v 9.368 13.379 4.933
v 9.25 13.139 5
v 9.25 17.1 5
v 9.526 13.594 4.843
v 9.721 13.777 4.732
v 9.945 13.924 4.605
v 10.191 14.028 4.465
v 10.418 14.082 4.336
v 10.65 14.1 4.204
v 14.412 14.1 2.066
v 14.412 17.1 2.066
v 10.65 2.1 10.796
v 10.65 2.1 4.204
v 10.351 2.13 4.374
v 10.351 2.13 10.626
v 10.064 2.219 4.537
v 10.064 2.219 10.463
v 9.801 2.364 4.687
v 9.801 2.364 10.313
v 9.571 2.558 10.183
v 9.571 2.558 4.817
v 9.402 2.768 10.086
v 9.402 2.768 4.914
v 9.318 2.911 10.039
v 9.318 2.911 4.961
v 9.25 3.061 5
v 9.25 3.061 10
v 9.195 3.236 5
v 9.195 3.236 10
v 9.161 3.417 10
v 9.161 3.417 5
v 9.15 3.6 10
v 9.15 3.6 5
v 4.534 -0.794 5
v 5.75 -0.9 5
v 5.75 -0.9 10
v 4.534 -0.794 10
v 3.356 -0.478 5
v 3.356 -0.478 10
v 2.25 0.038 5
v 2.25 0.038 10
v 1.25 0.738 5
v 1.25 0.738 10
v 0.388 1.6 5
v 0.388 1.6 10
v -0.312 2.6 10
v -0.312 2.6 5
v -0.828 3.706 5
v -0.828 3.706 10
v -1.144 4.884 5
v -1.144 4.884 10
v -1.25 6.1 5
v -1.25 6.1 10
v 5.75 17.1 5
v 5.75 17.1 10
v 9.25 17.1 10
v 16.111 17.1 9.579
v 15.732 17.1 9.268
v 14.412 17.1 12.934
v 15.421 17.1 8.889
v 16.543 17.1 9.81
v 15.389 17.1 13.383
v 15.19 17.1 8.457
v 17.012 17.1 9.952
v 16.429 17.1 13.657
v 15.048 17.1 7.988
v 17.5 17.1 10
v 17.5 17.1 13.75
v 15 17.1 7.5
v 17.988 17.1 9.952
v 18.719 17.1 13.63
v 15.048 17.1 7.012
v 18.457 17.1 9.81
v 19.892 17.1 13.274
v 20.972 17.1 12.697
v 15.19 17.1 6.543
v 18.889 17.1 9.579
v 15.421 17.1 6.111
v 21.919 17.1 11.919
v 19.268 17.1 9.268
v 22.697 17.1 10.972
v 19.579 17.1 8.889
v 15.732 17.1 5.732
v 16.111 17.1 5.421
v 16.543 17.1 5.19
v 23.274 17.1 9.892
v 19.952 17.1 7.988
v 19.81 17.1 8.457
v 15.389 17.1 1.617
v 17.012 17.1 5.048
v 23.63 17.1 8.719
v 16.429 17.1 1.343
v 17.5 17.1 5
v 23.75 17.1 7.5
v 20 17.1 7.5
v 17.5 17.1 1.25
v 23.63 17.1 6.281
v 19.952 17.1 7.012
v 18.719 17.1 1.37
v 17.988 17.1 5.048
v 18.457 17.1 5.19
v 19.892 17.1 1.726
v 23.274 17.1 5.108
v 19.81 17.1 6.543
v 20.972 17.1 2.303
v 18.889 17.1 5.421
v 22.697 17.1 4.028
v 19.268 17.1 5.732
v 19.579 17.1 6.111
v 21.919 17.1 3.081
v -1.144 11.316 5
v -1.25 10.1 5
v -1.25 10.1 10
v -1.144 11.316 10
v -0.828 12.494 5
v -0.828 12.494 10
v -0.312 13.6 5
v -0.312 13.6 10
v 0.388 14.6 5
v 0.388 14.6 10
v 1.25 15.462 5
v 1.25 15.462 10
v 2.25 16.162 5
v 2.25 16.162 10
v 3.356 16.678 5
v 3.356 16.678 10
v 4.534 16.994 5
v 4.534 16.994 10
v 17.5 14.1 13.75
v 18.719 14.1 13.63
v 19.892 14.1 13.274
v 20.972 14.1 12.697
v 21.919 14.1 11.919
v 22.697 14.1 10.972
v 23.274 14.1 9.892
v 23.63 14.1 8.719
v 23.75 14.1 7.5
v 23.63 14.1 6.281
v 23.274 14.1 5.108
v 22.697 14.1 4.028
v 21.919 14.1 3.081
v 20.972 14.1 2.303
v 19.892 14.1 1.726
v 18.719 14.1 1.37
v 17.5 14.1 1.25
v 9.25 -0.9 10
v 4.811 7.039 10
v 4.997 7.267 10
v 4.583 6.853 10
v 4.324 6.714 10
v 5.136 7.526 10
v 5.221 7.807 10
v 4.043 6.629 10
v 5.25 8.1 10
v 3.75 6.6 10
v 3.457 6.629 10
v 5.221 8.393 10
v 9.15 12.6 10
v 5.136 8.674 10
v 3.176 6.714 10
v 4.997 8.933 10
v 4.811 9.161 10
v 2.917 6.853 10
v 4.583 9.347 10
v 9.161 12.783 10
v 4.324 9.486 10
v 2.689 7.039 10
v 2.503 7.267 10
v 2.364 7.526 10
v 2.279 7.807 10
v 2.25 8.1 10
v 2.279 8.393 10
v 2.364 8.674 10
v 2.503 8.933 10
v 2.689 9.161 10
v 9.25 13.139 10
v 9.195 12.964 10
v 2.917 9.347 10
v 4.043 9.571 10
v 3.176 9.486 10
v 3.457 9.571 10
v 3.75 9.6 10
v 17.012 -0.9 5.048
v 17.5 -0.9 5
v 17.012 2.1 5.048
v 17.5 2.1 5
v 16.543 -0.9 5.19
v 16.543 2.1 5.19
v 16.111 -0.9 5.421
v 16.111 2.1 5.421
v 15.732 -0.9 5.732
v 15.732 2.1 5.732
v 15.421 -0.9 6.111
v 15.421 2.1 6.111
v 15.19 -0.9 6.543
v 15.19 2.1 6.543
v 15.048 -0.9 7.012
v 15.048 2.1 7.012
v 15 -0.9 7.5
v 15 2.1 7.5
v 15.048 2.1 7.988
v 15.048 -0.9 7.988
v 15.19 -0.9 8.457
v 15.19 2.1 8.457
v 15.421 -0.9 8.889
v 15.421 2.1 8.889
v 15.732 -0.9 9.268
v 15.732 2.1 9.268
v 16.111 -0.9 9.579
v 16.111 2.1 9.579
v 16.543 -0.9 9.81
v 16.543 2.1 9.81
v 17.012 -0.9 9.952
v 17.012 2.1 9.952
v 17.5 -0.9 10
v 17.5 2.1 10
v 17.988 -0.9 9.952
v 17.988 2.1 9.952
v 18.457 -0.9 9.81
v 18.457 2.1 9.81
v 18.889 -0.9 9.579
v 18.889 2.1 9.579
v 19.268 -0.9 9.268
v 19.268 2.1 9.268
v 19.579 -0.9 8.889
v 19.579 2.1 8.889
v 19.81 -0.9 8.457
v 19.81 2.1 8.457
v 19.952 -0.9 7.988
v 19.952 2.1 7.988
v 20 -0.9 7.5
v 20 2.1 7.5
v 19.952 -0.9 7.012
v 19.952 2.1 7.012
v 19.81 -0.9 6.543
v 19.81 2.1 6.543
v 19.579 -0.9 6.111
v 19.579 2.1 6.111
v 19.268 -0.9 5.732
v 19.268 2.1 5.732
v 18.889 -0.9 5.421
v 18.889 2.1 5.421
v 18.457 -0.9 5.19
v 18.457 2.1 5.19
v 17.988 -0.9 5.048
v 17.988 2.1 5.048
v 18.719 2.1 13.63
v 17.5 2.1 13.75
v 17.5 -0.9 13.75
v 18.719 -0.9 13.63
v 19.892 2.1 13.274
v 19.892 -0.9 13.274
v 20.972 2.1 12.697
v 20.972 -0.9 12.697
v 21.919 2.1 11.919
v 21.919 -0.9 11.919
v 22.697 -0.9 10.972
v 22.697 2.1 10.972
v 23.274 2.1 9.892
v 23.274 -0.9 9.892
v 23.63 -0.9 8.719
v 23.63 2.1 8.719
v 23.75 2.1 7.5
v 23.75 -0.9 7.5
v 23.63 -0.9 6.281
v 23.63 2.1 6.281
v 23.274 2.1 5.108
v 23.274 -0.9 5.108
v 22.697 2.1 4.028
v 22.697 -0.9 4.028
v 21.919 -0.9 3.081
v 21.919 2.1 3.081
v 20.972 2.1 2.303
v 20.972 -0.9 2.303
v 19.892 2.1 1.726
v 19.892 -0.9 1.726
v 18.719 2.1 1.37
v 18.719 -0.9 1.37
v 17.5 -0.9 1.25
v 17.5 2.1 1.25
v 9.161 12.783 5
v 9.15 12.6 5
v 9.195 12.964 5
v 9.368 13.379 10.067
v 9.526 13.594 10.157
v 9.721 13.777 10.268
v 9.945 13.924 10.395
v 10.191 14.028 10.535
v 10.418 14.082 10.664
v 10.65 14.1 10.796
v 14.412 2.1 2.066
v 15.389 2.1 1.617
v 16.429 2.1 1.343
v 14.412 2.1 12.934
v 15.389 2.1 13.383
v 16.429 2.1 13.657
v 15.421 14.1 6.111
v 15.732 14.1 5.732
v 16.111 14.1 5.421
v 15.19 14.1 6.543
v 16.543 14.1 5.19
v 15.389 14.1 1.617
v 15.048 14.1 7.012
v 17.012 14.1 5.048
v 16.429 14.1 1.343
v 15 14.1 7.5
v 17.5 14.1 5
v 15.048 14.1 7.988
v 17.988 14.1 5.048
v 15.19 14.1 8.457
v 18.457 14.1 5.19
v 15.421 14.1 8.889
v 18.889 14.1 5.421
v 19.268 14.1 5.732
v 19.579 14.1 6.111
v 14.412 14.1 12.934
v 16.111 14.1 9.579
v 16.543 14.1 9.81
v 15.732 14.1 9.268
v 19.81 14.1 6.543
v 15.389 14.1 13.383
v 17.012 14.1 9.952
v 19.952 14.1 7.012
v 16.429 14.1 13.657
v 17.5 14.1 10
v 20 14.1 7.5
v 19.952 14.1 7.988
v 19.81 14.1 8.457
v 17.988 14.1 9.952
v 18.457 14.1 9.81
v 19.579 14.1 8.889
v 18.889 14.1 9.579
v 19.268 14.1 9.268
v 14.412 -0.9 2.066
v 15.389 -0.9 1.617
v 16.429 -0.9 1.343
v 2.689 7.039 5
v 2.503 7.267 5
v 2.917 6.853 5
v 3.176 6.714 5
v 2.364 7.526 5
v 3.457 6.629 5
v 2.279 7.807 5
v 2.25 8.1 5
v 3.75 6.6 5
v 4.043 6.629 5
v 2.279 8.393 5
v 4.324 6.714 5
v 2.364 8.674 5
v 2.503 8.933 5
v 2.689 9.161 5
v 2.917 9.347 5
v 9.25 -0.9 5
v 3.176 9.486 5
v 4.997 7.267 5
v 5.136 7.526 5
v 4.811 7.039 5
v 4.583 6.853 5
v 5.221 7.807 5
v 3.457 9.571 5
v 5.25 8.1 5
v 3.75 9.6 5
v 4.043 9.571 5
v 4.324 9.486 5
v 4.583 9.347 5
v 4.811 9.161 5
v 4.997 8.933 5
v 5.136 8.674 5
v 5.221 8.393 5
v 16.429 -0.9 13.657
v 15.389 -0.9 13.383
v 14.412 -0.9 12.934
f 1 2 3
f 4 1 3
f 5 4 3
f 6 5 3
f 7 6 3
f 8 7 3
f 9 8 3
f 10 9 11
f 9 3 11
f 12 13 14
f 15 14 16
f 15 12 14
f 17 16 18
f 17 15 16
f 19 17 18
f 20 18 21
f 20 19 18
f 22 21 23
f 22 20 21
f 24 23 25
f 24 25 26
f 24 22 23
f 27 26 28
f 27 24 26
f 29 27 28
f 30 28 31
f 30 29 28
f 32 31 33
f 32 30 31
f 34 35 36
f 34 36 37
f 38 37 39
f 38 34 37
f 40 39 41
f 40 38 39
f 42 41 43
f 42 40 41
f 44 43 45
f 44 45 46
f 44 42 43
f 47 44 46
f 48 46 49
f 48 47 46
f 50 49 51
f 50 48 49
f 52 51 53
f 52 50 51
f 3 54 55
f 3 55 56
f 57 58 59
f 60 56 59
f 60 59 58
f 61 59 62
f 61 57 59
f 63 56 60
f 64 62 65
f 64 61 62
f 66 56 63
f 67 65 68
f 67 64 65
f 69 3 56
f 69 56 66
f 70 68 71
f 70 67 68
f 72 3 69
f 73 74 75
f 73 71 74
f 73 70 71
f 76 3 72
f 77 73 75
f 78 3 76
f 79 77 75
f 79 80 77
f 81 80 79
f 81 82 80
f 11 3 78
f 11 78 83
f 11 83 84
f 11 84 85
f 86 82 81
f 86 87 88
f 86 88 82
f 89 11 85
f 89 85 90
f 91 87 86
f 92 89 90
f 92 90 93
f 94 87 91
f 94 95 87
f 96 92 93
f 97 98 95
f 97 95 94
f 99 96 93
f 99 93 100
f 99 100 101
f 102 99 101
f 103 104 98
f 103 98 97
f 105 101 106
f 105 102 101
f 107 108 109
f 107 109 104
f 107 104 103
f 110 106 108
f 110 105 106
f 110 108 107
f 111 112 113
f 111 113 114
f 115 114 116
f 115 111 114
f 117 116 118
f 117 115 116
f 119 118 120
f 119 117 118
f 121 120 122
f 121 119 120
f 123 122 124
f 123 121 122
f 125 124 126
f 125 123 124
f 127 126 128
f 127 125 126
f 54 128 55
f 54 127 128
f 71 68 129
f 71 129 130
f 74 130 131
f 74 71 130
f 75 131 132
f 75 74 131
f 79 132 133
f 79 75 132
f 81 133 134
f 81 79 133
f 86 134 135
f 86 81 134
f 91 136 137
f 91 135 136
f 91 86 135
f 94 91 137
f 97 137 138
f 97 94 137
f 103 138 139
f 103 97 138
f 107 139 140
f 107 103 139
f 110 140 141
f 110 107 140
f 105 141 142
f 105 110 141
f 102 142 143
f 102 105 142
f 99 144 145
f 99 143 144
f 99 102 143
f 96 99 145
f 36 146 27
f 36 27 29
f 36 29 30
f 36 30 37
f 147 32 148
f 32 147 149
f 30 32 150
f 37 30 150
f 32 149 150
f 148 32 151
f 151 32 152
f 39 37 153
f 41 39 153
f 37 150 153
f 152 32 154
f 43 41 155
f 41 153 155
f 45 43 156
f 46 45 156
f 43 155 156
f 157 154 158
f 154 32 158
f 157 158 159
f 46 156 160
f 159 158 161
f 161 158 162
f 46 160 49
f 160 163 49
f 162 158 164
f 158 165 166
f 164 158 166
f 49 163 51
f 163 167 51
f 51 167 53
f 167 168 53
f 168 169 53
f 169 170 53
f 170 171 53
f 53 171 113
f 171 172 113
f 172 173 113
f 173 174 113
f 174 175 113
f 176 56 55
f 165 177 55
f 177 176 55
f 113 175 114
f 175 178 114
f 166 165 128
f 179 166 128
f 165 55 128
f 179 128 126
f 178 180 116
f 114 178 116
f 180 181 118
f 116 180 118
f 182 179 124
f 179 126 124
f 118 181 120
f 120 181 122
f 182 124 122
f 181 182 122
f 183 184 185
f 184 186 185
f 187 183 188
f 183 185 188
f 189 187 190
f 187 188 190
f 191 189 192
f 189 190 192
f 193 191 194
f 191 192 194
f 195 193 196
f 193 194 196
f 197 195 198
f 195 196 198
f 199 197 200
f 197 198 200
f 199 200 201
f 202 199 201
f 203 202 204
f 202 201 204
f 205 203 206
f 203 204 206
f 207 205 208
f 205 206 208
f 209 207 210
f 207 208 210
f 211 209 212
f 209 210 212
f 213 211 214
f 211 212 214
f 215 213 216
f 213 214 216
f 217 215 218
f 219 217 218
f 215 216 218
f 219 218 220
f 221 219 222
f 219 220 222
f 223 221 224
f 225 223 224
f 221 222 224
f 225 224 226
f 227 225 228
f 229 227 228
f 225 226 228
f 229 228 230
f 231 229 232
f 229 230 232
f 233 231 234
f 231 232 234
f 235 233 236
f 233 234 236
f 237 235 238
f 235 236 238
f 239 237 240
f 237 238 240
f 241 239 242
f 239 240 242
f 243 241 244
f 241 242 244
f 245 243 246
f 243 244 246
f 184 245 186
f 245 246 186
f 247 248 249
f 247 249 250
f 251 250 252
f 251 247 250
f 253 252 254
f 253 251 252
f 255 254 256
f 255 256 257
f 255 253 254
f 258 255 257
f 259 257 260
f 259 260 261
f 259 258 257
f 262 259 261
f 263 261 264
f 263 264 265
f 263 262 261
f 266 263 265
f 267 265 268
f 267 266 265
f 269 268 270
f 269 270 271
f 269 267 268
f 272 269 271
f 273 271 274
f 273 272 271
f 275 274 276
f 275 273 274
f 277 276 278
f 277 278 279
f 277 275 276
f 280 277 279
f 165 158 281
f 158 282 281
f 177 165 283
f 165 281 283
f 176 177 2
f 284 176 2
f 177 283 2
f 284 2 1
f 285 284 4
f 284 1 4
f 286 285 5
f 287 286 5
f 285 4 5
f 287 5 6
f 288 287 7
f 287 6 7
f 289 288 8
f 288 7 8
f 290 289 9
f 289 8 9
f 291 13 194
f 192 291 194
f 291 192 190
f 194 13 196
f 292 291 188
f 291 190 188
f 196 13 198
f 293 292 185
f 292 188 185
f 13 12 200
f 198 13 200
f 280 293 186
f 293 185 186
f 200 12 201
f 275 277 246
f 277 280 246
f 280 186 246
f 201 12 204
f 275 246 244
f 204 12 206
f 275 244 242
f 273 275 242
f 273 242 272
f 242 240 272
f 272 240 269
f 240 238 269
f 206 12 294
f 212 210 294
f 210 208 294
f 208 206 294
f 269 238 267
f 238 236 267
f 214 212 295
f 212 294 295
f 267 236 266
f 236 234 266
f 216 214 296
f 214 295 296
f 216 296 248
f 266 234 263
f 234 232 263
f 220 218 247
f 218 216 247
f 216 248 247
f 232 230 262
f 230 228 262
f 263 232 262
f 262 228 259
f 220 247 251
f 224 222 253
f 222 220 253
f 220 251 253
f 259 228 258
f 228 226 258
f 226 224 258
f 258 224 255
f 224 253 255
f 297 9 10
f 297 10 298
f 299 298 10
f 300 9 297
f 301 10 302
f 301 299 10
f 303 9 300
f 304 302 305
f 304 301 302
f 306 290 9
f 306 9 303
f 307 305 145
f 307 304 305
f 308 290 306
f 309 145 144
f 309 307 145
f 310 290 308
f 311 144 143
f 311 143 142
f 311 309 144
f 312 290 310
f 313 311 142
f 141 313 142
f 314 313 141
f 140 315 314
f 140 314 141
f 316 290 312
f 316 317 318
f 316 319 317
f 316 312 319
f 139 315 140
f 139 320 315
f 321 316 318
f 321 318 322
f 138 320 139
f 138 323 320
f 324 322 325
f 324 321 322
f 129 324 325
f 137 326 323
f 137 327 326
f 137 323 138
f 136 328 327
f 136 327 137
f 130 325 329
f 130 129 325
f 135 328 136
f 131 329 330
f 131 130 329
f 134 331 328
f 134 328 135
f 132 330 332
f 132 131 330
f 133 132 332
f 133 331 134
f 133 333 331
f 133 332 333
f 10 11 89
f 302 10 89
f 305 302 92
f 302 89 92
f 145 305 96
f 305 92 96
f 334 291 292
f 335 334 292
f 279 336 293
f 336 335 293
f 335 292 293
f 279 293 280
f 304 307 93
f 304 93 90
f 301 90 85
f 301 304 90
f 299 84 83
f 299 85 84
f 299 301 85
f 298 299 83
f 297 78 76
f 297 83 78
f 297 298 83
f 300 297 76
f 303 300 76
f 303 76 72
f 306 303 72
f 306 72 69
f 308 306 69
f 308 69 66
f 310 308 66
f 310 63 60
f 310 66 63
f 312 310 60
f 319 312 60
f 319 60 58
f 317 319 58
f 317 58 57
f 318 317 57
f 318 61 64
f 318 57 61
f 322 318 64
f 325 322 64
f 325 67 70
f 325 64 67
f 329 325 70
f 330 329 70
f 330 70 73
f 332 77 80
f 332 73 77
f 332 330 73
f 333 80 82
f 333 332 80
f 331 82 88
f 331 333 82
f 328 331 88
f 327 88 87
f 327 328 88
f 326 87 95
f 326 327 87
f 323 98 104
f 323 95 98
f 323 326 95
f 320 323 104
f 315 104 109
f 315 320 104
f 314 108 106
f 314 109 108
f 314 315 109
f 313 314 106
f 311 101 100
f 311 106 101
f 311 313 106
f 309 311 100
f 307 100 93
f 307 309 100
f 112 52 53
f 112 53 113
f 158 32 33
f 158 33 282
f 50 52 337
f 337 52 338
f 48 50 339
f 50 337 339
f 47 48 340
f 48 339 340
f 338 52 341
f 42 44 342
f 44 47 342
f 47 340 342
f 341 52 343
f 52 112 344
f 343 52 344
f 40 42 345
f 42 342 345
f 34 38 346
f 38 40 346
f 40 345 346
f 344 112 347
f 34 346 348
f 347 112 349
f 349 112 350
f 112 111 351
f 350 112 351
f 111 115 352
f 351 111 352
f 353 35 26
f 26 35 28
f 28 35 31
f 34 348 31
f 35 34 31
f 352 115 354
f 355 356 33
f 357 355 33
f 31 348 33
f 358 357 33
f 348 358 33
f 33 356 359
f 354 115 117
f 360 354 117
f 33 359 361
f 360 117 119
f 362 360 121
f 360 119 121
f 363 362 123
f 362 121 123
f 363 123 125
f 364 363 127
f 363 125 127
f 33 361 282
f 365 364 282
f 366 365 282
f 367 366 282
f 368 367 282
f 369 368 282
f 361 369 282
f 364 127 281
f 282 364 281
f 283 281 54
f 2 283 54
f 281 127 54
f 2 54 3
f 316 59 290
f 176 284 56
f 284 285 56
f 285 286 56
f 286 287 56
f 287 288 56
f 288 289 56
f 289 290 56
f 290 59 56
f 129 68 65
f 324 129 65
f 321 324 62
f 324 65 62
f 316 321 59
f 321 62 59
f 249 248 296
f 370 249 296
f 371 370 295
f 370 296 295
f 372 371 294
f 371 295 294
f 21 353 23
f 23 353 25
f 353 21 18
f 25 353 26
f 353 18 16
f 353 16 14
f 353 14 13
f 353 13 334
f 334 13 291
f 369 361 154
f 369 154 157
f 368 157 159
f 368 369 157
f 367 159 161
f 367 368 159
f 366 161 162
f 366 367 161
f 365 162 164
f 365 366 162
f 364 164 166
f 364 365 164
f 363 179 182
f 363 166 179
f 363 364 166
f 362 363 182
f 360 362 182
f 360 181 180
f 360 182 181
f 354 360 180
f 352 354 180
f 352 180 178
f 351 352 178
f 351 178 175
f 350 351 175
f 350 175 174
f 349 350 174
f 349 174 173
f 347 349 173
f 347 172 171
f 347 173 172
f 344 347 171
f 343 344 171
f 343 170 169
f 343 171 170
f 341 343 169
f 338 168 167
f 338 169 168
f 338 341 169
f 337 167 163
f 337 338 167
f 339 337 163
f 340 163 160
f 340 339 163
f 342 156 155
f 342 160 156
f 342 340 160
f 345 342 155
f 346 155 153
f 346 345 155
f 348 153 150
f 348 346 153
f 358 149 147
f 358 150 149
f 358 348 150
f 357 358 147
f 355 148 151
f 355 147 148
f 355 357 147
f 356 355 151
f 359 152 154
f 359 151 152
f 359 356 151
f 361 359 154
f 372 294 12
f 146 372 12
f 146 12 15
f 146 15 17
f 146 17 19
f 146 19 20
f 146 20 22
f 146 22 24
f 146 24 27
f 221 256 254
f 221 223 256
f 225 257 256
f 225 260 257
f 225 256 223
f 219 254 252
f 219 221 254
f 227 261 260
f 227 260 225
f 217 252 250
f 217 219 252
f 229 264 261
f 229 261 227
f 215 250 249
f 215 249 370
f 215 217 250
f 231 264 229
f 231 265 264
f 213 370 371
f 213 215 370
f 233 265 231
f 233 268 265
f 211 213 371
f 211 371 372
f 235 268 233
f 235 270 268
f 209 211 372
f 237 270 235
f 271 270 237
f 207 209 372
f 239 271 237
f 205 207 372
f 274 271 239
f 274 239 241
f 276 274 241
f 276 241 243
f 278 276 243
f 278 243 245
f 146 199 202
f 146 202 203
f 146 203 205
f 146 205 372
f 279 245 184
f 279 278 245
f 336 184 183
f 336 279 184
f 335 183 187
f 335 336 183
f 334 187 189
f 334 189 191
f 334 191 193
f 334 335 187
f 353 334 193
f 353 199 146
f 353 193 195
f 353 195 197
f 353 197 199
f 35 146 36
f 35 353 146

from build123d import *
from build123d.topology import SkipClean

# Parameters (mm, degrees)
CROQUIS1_R              = 1.5
SALIENTE_EXTRUIR1_DEPTH = 15
CROQUIS2_R              = 2.5
CORTAR_EXTRUIR1_DEPTH   = 20
CORTAR_EXTRUIR2_DEPTH   = 22
CROQUIS4_W              = 3.68086323
CROQUIS4_H              = 12
CORTAR_EXTRUIR3_DEPTH   = 10
REDONDEO1_R             = 1.5


with BuildPart() as part:
    # Croquis1 → Saliente-Extruir1 (new body)
    with BuildSketch(Plane.XY):
        with BuildLine():
            Line((11.25, 14.1), (11.25, 11.1))
            Line((11.25, 11.1), (11.25, 5.1))
            Line((11.25, 5.1), (11.25, 2.1))
            Line((11.25, 2.1), (23.75, 2.1))
            Line((23.75, 2.1), (23.75, -0.9))
            Line((23.75, -0.9), (11.25, -0.9))
            Line((11.25, -0.9), (5.75, -0.9))
            ThreePointArc((5.75, -0.9), (0.800252532, 1.150252532), (-1.25, 6.1))
            Line((-1.25, 6.1), (-1.25, 10.1))
            ThreePointArc((-1.25, 10.1), (0.800252532, 15.049747468), (5.75, 17.1))
            Line((5.75, 17.1), (11.25, 17.1))
            Line((11.25, 17.1), (23.75, 17.1))
            Line((23.75, 17.1), (23.75, 14.1))
            Line((23.75, 14.1), (11.25, 14.1))
        make_face()
        with Locations((3.75, 8.1)):
            Circle(CROQUIS1_R, mode=Mode.SUBTRACT)
    extrude(amount=SALIENTE_EXTRUIR1_DEPTH)

    # Croquis2 → Cortar-Extruir1 (cut, symmetric)
    with BuildSketch(Plane(origin=(0, 0, 0), x_dir=(1, 0, 0), z_dir=(0, 1, 0))):
        with Locations(Location((17.5, -7.5, 0), (0, 0, 90))):
            Circle(CROQUIS2_R)
        with BuildLine():
            Line((17.5, -1.25), (11.25, 0))
            Line((11.25, 0), (11.126279301, 1.868603497))
            Line((11.126279301, 1.868603497), (29.663453957, 1.868603497))
            Line((29.663453957, 1.868603497), (29.663453957, -17.961269996))
            Line((29.663453957, -17.961269996), (11.25, -17.961269996))
            Line((11.25, -17.961269996), (11.25, -15))
            Line((11.25, -15), (17.5, -13.75))
            ThreePointArc((17.5, -13.75), (23.75, -7.5), (17.5, -1.25))
        make_face()
    extrude(amount=CORTAR_EXTRUIR1_DEPTH, both=True, mode=Mode.SUBTRACT)

    # Croquis3 → Cortar-Extruir2 (cut)
    with SkipClean():  # the faces are left unmerged after this step: merging them gives an invalid solid
        with BuildSketch(Plane(origin=(0, 17.1, 0), x_dir=(1, 0, 0), z_dir=(0, 1, 0))):
            Polygon((5.75, -10), (-2.050741432, -10), (-2.325121179, -18.2596058), (20.840368904, -18.2596058), (17.5, -13.75), (11.25, -15), (5.75, -15), align=None)
            with BuildLine():
                Line((9.25, -10), (5.75, -10))
                Line((5.75, -10), (5.75, -15))
                Line((5.75, -15), (11.25, -15))
                Line((11.25, -15), (17.5, -13.75))
                ThreePointArc((17.5, -13.75), (15.902831918, -13.542479137), (14.41172646, -12.933697318))
                Line((14.41172646, -12.933697318), (9.25, -10))
            make_face()
            with BuildLine():
                Line((5.75, 0), (5.75, -5))
                Line((5.75, -5), (9.25, -5))
                Line((9.25, -5), (14.41172646, -2.066302682))
                ThreePointArc((14.41172646, -2.066302682), (15.902831918, -1.457520863), (17.5, -1.25))
                Line((17.5, -1.25), (11.25, 0))
                Line((11.25, 0), (5.75, 0))
            make_face()
            Polygon((-2.050741432, -5), (5.75, -5), (5.75, 0), (11.25, 0), (17.5, -1.25), (17.5, 1.613327317), (-2.050741432, 1.613327317), align=None)
        extrude(amount=-CORTAR_EXTRUIR2_DEPTH, mode=Mode.SUBTRACT)

    # Croquis4 → Cortar-Extruir3 (cut, symmetric)
    with SkipClean():  # the faces are left unmerged after this step: merging them gives an invalid solid
        with BuildSketch(Plane.XY.offset(10)):
            with Locations((10.990431615, 8.1)):
                Rectangle(CROQUIS4_W, CROQUIS4_H)
        extrude(amount=CORTAR_EXTRUIR3_DEPTH, both=True, mode=Mode.SUBTRACT)

    # Redondeo1
    redondeo1_edges = [part.edges().sort_by_distance(p)[0] for p in [
        (9.15, 2.1, 7.5),
        (9.15, 14.1, 7.5),
    ]]
    fillet(redondeo1_edges, radius=REDONDEO1_R)


solid = part.part
